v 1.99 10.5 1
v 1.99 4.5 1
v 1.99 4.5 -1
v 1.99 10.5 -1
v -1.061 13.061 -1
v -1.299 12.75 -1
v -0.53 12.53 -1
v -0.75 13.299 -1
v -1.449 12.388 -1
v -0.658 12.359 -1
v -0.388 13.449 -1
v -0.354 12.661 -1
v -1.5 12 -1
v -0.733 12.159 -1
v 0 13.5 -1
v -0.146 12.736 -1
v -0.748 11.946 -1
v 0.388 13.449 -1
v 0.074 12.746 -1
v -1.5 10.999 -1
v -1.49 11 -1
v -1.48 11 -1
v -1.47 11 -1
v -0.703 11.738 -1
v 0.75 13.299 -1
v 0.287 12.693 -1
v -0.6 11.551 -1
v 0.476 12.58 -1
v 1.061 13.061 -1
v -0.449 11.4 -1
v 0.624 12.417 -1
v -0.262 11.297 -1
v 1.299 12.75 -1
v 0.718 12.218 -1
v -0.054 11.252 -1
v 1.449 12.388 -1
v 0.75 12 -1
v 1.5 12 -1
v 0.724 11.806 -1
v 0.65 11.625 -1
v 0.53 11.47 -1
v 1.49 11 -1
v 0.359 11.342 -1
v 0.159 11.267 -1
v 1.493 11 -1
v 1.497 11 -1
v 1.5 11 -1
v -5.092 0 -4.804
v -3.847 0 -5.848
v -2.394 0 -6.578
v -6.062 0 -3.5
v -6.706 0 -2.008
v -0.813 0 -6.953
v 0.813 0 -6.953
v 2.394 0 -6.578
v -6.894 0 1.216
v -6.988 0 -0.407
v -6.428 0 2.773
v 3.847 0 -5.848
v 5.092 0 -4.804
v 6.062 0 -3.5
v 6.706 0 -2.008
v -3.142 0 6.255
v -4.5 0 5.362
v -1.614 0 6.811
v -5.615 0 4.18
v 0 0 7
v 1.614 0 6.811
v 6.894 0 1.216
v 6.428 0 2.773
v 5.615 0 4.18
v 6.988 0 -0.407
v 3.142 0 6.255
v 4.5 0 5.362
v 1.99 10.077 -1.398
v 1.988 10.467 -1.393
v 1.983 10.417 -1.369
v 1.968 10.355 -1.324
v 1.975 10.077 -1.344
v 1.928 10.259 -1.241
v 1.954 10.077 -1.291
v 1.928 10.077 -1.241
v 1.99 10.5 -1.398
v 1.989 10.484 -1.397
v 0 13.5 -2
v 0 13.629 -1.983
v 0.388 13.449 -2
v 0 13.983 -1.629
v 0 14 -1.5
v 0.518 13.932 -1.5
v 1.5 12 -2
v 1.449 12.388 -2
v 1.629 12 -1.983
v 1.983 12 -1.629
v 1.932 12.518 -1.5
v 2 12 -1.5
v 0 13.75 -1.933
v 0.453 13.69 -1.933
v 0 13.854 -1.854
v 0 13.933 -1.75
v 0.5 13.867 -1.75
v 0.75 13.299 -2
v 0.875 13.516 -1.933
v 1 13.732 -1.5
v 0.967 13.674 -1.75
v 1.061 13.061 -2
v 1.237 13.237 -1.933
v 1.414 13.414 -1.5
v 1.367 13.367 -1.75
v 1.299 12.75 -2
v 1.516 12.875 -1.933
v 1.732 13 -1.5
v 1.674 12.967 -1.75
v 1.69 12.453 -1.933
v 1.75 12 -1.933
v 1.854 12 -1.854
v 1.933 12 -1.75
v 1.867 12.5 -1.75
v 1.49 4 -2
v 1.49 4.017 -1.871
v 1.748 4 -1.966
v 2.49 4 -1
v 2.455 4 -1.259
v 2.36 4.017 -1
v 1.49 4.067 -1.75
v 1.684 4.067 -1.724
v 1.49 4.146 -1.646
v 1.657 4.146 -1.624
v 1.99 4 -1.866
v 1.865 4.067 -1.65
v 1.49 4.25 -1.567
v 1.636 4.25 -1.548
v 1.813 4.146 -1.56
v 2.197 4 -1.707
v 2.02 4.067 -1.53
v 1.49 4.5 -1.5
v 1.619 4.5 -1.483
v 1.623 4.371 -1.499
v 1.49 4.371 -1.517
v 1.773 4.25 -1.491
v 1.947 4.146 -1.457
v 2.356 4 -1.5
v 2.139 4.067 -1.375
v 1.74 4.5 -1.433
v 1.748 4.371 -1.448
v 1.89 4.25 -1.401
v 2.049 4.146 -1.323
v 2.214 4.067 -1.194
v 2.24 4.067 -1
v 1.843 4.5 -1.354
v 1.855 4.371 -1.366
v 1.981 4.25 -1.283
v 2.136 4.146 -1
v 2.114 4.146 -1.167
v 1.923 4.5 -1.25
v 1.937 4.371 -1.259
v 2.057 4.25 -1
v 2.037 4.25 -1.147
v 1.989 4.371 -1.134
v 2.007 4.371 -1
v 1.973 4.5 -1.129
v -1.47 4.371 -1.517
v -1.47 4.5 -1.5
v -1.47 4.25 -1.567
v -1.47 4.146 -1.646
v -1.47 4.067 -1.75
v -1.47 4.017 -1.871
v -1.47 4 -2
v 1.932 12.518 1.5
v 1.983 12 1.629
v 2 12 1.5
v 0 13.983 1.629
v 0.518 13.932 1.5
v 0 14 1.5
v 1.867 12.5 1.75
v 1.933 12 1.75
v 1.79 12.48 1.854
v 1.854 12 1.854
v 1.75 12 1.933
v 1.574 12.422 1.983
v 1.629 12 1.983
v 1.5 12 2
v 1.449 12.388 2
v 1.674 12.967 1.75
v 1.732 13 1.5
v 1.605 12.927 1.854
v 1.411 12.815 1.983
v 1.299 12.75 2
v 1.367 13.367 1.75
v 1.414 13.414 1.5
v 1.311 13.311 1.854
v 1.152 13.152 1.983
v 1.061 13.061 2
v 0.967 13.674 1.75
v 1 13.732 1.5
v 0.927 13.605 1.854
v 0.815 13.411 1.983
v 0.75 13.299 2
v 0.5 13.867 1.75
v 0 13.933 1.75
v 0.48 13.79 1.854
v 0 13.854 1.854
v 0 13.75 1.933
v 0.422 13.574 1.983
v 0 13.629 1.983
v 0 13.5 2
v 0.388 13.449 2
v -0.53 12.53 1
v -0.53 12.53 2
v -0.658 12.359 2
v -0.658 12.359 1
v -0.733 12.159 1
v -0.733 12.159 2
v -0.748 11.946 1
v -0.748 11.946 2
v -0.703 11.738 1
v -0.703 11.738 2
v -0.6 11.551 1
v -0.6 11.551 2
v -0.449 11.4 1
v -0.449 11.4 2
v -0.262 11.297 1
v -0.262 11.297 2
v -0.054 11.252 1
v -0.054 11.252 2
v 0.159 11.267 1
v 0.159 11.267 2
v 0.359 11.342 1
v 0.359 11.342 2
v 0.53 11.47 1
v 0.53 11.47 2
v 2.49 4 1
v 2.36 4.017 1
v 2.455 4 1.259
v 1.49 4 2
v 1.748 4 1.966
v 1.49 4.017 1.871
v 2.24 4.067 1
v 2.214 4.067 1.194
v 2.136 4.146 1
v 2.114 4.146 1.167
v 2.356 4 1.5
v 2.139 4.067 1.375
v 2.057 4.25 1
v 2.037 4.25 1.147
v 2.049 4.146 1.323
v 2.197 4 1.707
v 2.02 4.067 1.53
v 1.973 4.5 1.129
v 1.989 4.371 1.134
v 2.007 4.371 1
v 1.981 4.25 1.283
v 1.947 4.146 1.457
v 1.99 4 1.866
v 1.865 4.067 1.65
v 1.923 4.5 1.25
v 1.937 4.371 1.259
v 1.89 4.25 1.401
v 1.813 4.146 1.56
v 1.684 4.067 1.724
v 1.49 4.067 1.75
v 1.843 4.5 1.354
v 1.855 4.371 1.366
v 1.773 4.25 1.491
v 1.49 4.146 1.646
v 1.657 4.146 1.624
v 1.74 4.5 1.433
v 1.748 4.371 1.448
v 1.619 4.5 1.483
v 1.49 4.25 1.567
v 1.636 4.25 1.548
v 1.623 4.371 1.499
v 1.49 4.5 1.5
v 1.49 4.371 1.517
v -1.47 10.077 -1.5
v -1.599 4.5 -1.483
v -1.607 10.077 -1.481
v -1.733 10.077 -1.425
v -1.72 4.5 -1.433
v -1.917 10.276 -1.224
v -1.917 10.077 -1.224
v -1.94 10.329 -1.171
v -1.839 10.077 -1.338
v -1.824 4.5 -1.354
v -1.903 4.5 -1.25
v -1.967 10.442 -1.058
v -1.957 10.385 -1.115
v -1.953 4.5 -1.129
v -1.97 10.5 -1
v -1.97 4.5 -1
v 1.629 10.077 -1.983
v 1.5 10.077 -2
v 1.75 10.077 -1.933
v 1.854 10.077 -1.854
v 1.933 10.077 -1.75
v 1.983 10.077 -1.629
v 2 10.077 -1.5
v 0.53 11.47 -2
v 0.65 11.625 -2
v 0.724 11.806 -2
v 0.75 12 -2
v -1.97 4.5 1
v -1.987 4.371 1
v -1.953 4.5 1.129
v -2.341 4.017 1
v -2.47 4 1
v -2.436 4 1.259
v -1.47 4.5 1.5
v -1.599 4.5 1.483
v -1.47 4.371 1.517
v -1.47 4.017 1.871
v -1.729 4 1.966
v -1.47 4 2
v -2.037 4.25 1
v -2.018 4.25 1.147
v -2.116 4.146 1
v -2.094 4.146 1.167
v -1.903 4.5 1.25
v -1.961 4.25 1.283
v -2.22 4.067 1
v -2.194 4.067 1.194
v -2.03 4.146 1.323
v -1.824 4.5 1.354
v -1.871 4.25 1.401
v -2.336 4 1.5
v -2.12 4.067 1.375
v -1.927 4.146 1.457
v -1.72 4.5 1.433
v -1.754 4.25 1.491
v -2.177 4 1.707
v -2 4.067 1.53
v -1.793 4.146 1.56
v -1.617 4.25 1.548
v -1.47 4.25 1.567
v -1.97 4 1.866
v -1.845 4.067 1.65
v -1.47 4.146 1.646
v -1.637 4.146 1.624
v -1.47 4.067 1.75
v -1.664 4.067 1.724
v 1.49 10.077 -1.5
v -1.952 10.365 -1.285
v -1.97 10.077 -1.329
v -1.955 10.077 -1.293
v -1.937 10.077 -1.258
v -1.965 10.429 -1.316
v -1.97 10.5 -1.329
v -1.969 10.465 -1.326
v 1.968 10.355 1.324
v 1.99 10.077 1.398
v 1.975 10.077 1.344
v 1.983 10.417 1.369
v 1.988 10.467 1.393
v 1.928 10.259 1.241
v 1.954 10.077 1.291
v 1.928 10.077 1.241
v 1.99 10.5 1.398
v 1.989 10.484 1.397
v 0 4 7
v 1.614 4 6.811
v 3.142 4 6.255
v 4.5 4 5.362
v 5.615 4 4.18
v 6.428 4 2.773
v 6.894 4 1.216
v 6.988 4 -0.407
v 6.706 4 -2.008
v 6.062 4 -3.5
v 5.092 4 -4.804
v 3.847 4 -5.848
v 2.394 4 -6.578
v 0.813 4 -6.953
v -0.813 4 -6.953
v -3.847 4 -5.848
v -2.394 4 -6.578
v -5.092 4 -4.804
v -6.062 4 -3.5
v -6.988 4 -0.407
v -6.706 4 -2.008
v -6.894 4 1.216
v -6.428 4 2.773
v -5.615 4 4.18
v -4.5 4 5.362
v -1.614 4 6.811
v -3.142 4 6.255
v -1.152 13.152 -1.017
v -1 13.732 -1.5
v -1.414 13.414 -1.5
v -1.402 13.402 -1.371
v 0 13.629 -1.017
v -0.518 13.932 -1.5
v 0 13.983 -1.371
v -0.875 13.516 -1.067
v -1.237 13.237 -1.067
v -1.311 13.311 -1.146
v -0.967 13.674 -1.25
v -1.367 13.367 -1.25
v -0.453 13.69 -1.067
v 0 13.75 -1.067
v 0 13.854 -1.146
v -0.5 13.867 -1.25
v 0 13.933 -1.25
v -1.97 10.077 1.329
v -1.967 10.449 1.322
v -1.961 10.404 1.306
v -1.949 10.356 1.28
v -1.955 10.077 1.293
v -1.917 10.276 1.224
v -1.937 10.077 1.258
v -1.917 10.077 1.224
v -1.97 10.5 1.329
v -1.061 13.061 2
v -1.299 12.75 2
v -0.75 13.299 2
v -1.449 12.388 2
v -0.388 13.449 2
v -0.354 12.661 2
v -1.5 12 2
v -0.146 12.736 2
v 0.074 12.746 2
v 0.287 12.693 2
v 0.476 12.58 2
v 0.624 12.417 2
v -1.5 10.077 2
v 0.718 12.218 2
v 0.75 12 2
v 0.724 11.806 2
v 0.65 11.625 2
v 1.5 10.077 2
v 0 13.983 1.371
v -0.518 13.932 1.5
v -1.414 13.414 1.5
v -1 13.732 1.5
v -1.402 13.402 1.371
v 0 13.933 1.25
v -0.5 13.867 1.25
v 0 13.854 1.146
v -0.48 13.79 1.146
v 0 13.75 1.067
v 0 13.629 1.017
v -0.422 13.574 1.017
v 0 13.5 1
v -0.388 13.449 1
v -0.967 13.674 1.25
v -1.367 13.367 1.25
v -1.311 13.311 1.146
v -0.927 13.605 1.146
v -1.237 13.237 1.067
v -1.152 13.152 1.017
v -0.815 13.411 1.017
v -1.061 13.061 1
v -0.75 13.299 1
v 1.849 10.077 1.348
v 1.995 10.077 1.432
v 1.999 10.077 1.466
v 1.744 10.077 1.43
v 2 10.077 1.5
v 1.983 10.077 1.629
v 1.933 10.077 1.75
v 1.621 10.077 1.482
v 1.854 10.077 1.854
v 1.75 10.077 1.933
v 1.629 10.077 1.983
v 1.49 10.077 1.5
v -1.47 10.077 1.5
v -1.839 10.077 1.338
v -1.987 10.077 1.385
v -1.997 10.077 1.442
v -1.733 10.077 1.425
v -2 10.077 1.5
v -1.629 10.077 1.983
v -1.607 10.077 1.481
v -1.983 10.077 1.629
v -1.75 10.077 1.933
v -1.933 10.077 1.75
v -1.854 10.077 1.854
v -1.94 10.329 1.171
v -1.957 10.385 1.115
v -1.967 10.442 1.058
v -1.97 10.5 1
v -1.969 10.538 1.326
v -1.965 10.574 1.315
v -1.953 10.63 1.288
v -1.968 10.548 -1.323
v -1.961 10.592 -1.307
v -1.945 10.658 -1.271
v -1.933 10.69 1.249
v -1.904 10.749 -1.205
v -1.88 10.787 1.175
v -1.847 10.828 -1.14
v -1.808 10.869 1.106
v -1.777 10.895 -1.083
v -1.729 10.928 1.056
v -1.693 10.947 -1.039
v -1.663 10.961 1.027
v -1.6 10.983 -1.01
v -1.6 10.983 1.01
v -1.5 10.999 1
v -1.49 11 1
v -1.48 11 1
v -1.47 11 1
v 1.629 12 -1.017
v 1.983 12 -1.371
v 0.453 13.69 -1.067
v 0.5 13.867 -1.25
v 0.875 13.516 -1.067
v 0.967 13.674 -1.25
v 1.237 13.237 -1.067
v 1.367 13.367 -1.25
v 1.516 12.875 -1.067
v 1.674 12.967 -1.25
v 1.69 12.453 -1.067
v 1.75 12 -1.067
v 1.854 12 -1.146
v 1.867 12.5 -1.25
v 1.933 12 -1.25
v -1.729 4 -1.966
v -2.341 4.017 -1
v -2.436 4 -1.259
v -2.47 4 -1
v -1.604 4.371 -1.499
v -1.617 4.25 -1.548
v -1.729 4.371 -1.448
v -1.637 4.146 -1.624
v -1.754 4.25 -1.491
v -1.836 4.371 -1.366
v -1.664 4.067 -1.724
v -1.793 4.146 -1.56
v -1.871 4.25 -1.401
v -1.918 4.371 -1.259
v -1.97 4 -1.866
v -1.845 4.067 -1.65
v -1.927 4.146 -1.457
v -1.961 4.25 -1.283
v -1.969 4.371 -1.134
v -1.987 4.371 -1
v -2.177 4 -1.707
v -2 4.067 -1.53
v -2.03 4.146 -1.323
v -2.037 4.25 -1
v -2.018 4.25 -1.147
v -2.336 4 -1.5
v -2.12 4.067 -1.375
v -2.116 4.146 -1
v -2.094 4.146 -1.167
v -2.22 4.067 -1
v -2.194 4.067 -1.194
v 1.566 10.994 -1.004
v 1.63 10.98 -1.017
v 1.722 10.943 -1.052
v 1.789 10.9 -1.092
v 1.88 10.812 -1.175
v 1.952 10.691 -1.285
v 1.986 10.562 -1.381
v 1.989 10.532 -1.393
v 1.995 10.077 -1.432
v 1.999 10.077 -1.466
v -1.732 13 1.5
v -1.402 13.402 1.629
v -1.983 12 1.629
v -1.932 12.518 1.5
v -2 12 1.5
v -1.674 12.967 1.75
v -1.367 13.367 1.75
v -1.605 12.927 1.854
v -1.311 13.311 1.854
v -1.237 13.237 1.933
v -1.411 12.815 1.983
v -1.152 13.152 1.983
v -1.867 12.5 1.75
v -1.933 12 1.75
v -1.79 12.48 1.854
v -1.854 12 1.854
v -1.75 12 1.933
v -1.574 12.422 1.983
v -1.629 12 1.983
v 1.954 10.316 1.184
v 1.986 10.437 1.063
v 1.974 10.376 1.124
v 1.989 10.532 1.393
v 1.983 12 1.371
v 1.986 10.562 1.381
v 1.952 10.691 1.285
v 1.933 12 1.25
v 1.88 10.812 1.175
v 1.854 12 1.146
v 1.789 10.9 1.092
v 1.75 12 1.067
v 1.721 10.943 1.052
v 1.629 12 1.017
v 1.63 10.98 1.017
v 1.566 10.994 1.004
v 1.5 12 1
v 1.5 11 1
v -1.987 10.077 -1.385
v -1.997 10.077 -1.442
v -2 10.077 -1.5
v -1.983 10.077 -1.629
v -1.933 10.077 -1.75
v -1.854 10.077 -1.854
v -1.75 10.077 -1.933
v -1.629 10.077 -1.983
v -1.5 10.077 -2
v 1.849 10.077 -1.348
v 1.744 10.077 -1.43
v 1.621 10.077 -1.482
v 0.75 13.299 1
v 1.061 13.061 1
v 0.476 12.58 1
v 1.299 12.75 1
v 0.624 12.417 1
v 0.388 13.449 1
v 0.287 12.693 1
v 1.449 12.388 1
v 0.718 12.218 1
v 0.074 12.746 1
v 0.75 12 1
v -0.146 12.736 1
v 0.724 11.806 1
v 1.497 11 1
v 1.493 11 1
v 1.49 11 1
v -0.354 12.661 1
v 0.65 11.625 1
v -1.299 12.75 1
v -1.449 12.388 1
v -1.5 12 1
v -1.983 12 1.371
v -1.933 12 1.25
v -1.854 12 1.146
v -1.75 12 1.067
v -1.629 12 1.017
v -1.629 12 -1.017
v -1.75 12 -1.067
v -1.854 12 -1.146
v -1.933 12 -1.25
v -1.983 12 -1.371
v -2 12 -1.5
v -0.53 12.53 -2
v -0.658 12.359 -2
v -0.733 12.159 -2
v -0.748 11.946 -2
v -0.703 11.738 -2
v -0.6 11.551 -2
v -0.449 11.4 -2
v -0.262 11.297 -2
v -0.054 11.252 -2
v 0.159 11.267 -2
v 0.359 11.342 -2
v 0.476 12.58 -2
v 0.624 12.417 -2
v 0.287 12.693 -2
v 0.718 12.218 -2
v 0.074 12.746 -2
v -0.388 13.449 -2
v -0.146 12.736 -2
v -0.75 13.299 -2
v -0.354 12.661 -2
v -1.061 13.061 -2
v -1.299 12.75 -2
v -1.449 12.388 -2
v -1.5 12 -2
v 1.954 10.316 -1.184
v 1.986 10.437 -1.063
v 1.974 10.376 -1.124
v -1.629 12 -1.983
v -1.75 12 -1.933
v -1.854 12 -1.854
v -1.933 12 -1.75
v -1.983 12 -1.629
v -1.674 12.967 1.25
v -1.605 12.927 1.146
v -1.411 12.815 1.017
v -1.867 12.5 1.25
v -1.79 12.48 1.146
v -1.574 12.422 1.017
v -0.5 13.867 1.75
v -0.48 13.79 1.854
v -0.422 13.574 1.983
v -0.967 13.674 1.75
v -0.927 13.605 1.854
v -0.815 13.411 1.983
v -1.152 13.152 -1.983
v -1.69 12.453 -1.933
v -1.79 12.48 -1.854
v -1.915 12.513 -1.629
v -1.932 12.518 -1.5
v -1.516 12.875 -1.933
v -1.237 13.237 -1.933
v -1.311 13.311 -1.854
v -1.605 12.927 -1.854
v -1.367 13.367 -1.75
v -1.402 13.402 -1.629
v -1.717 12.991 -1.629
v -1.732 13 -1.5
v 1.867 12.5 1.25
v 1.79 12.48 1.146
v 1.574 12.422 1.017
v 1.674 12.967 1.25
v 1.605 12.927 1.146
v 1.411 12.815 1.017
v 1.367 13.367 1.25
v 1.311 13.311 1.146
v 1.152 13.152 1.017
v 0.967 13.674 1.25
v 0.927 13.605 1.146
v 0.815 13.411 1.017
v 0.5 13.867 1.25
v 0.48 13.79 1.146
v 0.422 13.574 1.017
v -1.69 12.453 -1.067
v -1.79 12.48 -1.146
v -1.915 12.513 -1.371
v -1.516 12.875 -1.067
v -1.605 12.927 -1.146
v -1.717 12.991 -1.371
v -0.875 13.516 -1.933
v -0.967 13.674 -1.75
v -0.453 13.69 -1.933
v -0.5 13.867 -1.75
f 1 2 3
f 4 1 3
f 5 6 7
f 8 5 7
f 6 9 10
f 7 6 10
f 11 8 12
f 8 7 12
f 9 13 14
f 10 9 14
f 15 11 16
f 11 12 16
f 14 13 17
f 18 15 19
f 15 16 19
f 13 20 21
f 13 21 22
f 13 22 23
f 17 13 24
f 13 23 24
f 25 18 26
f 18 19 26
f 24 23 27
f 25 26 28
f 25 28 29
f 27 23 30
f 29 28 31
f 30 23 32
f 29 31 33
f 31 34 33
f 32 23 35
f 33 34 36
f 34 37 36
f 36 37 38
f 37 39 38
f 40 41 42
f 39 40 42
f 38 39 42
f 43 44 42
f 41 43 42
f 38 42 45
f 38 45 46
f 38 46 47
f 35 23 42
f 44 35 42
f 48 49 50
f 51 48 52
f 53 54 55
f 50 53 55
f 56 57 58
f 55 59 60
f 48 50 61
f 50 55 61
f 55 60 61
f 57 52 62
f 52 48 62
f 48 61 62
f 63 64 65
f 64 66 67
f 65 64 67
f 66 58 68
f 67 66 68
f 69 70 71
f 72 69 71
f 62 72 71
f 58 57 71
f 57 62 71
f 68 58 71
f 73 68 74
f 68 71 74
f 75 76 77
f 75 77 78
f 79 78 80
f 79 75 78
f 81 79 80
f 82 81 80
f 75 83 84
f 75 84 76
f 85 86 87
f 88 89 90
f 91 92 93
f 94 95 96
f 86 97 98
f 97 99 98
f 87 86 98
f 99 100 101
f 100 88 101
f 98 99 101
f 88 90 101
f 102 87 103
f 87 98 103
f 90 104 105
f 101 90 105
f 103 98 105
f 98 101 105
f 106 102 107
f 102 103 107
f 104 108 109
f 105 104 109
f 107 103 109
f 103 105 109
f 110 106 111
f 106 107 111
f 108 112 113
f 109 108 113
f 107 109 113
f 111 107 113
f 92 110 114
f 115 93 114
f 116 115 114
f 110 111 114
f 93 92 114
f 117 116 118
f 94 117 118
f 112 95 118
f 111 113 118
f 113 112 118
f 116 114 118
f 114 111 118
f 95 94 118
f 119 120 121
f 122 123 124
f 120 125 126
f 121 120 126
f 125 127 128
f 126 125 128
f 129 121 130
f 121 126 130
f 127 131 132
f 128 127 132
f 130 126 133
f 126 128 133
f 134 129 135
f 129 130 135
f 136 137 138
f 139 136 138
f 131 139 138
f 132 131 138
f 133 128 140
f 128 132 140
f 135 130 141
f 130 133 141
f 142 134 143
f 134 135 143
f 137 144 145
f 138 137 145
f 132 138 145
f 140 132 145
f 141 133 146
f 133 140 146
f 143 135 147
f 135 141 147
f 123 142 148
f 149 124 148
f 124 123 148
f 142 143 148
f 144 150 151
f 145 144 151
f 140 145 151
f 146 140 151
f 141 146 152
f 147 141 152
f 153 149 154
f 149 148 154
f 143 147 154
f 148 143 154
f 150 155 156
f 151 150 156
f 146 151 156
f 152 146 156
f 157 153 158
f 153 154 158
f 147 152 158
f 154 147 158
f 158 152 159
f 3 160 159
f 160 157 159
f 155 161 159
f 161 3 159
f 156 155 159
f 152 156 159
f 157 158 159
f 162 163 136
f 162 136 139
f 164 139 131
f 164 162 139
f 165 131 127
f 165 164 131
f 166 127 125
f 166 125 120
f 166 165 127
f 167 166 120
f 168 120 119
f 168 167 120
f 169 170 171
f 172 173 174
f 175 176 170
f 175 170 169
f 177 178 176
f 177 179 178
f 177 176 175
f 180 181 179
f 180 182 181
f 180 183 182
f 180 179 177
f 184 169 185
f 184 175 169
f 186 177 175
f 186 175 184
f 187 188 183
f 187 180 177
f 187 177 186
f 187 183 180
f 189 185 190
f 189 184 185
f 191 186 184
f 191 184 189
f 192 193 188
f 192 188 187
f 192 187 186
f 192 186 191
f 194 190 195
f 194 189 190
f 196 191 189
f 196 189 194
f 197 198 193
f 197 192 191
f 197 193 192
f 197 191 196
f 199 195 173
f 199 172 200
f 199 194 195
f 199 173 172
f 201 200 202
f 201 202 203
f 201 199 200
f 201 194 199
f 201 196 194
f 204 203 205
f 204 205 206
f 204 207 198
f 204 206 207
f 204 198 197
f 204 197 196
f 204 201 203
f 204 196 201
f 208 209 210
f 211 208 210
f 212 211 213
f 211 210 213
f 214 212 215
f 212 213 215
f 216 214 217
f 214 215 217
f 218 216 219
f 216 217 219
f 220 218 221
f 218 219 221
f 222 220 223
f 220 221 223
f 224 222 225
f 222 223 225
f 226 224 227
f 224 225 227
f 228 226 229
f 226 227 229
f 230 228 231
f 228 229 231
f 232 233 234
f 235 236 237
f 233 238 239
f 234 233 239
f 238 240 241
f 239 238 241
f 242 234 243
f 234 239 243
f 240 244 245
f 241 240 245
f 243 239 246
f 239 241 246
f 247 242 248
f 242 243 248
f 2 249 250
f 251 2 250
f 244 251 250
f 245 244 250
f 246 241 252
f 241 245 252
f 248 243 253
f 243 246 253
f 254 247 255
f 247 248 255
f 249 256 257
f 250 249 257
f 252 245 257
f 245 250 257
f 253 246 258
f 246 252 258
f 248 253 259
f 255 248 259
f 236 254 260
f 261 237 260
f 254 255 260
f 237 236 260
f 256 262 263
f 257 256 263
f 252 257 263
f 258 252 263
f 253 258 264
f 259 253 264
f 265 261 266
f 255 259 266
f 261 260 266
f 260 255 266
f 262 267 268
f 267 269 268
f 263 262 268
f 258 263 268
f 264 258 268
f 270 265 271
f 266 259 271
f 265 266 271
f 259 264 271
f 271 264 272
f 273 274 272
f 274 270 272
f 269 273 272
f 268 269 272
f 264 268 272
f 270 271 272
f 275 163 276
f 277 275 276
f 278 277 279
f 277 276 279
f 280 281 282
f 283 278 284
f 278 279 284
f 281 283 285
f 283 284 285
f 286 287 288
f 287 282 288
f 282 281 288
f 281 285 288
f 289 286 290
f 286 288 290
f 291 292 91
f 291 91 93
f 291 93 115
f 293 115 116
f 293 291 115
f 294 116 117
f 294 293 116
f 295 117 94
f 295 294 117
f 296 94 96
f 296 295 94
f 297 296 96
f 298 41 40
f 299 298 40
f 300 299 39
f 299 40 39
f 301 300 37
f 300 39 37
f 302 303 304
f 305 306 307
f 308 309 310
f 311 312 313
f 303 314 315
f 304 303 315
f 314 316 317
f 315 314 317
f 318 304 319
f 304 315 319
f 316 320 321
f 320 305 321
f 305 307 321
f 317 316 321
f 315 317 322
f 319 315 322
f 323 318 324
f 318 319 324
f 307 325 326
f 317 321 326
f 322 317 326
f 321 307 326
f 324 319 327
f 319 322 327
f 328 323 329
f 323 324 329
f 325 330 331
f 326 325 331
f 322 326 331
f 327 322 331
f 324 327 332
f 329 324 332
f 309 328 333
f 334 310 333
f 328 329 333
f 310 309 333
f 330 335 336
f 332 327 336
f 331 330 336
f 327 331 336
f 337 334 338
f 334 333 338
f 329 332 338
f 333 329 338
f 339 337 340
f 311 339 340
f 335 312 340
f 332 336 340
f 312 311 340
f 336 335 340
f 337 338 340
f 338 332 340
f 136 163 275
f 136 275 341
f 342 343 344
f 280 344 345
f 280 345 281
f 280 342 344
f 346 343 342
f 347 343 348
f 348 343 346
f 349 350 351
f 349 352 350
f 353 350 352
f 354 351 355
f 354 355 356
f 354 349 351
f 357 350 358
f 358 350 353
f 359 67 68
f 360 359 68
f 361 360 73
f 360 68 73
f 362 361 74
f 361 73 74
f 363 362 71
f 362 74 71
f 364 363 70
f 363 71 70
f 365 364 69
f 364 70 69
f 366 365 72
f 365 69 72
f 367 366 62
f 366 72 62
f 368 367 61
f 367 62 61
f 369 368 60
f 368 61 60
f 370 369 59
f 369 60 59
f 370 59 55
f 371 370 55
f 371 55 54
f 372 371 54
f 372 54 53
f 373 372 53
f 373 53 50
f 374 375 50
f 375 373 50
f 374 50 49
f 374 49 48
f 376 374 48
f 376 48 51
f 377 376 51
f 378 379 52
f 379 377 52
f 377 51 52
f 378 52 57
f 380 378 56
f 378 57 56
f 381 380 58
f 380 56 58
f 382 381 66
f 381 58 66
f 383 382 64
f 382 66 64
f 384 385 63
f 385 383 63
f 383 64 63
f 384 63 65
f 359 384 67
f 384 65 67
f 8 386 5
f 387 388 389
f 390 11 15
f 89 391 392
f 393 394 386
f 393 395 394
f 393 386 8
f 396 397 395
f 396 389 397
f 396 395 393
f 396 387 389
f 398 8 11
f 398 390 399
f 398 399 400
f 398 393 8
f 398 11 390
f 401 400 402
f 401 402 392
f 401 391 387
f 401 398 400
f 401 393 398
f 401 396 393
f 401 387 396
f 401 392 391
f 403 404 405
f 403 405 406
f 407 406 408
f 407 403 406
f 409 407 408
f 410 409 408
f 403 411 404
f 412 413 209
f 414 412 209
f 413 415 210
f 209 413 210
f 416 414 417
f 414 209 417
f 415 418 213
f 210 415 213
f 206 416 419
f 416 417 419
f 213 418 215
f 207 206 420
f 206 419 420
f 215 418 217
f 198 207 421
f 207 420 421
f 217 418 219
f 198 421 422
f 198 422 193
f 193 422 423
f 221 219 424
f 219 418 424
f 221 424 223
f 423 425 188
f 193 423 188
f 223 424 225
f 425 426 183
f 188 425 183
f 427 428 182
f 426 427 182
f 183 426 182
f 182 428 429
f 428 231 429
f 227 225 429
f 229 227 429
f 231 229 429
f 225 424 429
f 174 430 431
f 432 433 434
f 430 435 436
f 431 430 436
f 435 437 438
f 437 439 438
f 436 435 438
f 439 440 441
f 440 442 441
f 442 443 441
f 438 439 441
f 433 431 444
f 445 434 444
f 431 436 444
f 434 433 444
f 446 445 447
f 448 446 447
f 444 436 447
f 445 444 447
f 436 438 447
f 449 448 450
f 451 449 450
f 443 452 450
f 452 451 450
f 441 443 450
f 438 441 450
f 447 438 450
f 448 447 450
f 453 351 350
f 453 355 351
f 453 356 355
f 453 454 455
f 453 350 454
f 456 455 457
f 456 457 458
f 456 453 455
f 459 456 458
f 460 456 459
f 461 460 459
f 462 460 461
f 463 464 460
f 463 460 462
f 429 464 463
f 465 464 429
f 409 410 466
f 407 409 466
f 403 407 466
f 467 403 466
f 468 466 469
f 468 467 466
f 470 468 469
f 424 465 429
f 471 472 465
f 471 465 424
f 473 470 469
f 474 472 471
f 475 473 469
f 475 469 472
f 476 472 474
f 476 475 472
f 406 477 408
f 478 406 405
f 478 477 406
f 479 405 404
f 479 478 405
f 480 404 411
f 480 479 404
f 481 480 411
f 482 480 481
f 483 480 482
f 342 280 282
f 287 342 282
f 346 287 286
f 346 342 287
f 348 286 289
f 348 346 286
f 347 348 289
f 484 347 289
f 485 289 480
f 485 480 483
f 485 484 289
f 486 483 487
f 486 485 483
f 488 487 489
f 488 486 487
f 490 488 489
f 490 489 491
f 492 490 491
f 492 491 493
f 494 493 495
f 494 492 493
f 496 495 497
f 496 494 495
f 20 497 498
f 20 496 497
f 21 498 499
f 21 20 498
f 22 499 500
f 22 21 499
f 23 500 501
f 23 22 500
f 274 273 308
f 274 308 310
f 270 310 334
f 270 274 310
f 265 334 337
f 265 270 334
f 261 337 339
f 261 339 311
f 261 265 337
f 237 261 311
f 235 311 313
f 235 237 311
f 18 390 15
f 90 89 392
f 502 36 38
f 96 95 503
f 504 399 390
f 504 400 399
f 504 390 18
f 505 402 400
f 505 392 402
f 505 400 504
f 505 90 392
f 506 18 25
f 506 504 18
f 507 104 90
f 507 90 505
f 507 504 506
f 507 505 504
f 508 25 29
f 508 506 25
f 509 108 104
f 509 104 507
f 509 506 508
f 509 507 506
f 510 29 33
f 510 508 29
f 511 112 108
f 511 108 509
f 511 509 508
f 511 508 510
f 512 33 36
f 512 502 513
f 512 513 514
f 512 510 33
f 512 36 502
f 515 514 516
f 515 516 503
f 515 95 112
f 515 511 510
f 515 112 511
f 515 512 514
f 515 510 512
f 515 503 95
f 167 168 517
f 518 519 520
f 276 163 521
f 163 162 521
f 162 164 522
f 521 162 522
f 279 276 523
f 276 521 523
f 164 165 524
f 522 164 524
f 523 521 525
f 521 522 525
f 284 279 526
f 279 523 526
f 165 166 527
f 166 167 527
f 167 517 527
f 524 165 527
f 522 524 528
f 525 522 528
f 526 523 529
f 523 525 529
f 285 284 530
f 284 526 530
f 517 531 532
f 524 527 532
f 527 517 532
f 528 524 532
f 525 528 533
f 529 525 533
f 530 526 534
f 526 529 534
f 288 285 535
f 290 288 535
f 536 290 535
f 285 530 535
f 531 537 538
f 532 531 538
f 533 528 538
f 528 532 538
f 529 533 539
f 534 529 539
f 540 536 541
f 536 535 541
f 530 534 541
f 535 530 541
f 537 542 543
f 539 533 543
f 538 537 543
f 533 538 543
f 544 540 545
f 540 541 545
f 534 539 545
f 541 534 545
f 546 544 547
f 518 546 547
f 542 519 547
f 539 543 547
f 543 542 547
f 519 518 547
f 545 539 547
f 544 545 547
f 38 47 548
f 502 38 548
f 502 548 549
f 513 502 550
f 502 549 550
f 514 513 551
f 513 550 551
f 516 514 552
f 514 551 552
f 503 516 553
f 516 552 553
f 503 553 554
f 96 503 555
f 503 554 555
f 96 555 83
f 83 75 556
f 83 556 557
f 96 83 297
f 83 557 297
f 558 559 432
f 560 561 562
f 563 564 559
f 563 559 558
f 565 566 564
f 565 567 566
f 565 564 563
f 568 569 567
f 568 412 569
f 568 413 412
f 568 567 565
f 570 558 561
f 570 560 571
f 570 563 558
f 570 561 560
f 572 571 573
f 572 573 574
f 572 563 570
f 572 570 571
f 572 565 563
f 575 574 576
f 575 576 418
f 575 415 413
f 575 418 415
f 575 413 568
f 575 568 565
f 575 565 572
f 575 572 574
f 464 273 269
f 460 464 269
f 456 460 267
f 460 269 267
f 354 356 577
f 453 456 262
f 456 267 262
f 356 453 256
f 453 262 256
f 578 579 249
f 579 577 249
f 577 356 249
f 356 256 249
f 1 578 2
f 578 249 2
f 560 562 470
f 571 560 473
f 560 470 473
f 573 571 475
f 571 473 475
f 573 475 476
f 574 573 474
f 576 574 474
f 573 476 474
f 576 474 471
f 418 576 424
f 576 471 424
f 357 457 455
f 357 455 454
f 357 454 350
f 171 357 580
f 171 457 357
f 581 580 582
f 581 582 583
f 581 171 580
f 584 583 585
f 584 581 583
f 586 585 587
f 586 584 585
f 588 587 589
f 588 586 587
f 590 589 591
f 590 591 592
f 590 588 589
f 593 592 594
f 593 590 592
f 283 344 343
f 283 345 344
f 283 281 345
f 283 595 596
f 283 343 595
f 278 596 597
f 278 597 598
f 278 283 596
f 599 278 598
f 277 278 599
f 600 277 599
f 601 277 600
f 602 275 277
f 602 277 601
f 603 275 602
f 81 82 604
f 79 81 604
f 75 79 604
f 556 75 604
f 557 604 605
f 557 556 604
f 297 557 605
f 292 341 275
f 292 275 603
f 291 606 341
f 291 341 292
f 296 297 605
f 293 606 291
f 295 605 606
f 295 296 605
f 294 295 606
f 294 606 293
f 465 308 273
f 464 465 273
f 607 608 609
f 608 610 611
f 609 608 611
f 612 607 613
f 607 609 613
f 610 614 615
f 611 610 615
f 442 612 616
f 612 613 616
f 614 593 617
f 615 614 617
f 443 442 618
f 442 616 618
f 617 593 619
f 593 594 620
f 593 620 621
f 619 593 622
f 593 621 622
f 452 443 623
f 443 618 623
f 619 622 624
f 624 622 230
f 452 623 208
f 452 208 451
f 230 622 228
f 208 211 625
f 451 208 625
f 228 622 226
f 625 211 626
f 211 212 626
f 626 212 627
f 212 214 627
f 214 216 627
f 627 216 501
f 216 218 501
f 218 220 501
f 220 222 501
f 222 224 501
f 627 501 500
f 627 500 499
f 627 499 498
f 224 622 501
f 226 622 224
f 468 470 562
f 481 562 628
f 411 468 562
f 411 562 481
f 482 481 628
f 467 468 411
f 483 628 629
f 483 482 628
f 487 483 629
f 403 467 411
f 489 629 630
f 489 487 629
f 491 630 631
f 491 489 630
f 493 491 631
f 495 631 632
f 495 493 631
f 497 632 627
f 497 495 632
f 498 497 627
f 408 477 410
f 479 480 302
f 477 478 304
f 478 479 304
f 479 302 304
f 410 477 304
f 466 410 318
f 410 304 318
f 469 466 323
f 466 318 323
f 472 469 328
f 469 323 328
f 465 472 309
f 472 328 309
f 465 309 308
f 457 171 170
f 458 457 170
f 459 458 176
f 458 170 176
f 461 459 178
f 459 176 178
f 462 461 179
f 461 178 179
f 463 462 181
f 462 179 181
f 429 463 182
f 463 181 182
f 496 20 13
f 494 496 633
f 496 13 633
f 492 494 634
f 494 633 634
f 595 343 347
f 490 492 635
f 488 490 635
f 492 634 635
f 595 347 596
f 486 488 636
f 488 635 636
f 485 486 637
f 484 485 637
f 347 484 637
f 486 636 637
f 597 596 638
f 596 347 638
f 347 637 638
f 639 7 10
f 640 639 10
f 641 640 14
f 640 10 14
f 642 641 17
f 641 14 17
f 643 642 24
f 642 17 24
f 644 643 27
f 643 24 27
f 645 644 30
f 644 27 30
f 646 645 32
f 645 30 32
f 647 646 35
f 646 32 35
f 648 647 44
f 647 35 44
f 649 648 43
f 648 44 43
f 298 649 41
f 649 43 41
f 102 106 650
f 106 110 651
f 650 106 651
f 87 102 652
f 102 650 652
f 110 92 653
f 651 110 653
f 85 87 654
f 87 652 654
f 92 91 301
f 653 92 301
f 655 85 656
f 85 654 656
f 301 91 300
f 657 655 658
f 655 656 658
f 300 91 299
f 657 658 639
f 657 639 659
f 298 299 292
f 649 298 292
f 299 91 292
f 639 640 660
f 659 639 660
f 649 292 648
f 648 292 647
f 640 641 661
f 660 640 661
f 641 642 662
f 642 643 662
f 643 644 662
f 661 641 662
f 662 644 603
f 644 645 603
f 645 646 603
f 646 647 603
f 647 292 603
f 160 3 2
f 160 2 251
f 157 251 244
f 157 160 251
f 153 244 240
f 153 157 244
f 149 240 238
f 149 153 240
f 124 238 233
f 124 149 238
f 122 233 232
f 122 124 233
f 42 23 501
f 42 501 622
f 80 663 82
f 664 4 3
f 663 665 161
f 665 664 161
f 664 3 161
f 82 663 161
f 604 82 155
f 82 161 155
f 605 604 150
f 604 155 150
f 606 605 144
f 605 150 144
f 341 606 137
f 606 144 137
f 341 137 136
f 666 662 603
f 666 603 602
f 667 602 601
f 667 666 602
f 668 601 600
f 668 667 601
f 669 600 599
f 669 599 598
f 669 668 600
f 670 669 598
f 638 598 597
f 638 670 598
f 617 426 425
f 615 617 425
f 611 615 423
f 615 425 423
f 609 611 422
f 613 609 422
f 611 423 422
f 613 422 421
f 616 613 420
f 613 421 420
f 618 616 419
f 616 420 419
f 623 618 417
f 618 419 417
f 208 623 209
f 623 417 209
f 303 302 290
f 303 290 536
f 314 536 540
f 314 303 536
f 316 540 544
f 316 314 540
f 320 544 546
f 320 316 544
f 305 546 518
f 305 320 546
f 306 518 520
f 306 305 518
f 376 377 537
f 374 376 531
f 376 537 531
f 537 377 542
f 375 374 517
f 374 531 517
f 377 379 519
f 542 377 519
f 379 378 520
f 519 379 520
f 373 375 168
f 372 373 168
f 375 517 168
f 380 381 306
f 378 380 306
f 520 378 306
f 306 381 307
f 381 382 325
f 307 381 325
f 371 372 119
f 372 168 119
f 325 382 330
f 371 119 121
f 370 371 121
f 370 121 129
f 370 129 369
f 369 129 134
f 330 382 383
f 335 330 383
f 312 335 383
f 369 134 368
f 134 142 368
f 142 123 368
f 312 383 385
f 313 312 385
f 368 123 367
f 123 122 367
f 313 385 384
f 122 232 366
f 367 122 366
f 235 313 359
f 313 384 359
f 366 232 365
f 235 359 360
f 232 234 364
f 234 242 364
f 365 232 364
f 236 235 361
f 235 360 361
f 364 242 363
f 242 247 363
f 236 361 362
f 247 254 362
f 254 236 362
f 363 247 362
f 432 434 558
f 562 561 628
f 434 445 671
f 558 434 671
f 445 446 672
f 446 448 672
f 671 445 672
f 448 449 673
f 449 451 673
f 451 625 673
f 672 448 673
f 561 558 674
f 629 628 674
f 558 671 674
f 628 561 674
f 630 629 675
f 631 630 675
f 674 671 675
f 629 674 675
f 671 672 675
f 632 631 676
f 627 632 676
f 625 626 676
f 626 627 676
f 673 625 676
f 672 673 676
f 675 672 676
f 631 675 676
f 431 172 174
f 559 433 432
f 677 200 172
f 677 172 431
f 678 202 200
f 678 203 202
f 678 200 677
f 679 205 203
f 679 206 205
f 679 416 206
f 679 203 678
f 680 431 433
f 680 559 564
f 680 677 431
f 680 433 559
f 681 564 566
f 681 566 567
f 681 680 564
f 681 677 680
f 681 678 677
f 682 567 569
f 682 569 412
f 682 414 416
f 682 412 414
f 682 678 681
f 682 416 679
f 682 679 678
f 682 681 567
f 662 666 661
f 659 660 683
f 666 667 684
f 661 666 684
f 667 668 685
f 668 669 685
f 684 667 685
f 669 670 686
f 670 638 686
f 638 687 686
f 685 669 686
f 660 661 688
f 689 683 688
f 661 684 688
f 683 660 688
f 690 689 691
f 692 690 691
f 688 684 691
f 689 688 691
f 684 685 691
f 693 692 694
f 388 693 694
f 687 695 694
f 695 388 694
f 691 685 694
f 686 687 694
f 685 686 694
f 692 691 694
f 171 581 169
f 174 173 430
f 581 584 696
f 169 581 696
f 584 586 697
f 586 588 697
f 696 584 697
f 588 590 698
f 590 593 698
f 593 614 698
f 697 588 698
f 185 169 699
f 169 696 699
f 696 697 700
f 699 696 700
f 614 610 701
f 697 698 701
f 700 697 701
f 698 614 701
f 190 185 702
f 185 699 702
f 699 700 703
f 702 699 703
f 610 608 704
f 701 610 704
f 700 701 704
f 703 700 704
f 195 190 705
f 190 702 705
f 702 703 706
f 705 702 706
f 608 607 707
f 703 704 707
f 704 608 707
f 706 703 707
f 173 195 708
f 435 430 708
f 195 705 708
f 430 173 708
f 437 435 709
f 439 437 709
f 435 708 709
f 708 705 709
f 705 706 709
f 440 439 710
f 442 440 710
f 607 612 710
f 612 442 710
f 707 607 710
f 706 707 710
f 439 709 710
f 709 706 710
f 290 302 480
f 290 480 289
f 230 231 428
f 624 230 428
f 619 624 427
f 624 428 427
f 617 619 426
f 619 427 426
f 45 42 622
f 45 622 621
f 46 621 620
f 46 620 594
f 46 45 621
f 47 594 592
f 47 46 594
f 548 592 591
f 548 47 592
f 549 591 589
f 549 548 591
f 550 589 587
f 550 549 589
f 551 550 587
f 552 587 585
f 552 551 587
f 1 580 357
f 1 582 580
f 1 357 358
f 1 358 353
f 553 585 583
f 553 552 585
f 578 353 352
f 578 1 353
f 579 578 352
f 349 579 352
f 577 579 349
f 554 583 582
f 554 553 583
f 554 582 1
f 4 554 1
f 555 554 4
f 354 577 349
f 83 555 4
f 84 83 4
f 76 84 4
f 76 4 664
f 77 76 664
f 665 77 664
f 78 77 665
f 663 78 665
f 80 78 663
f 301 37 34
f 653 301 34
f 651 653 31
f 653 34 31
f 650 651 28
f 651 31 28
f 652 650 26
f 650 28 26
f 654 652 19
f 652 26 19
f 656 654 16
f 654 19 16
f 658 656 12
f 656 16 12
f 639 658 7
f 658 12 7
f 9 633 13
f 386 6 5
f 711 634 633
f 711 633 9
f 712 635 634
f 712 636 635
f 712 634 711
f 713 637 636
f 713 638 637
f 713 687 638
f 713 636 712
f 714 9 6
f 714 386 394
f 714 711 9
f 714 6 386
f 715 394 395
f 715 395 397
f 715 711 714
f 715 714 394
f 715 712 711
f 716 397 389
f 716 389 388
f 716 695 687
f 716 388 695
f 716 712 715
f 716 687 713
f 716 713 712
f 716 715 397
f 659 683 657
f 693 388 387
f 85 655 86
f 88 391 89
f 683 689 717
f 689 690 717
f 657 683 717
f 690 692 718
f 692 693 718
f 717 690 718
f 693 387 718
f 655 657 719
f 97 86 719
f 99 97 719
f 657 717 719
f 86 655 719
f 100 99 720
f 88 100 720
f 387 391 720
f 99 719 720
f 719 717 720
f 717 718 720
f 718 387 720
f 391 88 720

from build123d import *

# Parameters (mm, degrees)
SKETCH1_R           = 7
BOSS_EXTRUDE1_DEPTH = 10
SKETCH2_W           = 2
SKETCH2_H           = 1
BOSS_EXTRUDE2_DEPTH = 4
CUT_EXTRUDE2_DEPTH  = 10
FILLET1_R           = 1
FILLET2_R           = 0.5
CUT_EXTRUDE4_DEPTH  = 10
SKETCH5_W           = 3.959584723
SKETCH5_H           = 3
BOSS_EXTRUDE3_DEPTH = 7
FILLET3_R           = 0.5
FILLET4_R           = 0.5


# Some blends are built 0.0001 mm under size
with BuildPart() as part:
    # Sketch1 → Boss-Extrude1 (new body)
    with BuildSketch(Plane(origin=(0, 0, 0), x_dir=(1, 0, 0), z_dir=(0, 1, 0))):
        with Locations(Location((0, 0, 0), (0, 0, 270))):
            Circle(SKETCH1_R)
    extrude(amount=BOSS_EXTRUDE1_DEPTH)

    # Sketch2 → Boss-Extrude2 (add)
    with BuildSketch(Plane(origin=(0, 10, 0), x_dir=(1, 0, 0), z_dir=(0, 1, 0))):
        with Locations((-1, 1.5)):
            Rectangle(SKETCH2_W, SKETCH2_H)
        with Locations((1, 1.5)):
            Rectangle(SKETCH2_W, SKETCH2_H)
        with Locations((1, -1.5)):
            Rectangle(SKETCH2_W, SKETCH2_H)
        with Locations((-1, -1.5)):
            Rectangle(SKETCH2_W, SKETCH2_H)
    extrude(amount=BOSS_EXTRUDE2_DEPTH)

    # Sketch3 → Cut-Extrude2 (cut)
    with BuildSketch(Plane.XY.offset(2)):
        with BuildLine():
            Line((2, 14), (0, 14))
            ThreePointArc((0, 14), (1.414213562, 13.414213562), (2, 12))
            Line((2, 12), (2, 14))
        make_face()
        with BuildLine():
            Line((0, 14), (-2, 14))
            Line((-2, 14), (-1.414213562, 13.414213562))
            ThreePointArc((-1.414213562, 13.414213562), (-0.765366865, 13.847759065), (0, 14))
        make_face()
        with BuildLine():
            Line((-1.414213562, 13.414213562), (-2, 14))
            Line((-2, 14), (-2, 12))
            ThreePointArc((-2, 12), (-1.847759065, 12.765366865), (-1.414213562, 13.414213562))
        make_face()
        with BuildLine():
            ThreePointArc((0.75, 12), (0.287012574, 12.692909649), (-0.530330086, 12.530330086))
            Line((-0.530330086, 12.530330086), (0.530330086, 11.469669914))
            ThreePointArc((0.530330086, 11.469669914), (0.692909649, 11.712987426), (0.75, 12))
        make_face()
        with BuildLine():
            Line((0.530330086, 11.469669914), (-0.530330086, 12.530330086))
            ThreePointArc((-0.530330086, 12.530330086), (-0.530330086, 11.469669914), (0.530330086, 11.469669914))
        make_face()
    extrude(amount=-CUT_EXTRUDE2_DEPTH, mode=Mode.SUBTRACT)

    # Fillet1
    fillet1_edges = [part.edges().sort_by_distance(p)[0] for p in [
        (0, 10, -7),
    ]]
    fillet(fillet1_edges, radius=FILLET1_R)

    # Fillet2
    fillet2_edges = [part.edges().sort_by_distance(p)[0] for p in [
        (2, 11, 1),
        (-2, 11, 1),
        (2, 11, 2),
        (-2, 11, 2),
        (-2, 11, -2),
        (2, 11, -2),
        (-2, 11, -1),
        (2, 11, -1),
        (0, 14, 1),
        (0, 14, 2),
        (0, 14, -2),
        (0, 14, -1),
    ]]
    fillet(fillet2_edges, radius=FILLET2_R - 0.0001)  # a hair under: the kernel refuses the full size

    # Sketch4 → Cut-Extrude4 (cut, symmetric)
    with BuildSketch(Plane.XY):
        Polygon((-7, 4), (7, 4), (9.323554176, 4), (9.323554176, 10.076967931), (-7.870406088, 10.076967931), (-7.870406088, 4), align=None)
    extrude(amount=CUT_EXTRUDE4_DEPTH, both=True, mode=Mode.SUBTRACT)


with BuildPart() as cut_extrude4_piece_1:
    # of the separate pieces the step leaves, piece 1, a body of its own (cut_extrude4_pieces)
    add(part.part.solids().sort_by_distance((0, 0, 7))[0])



with BuildPart() as cut_extrude4_piece_2:
    # of the separate pieces the step leaves, piece 2, a body of its own (cut_extrude4_pieces)
    add(part.part.solids().sort_by_distance((-1.5001, 10.076967931, 2))[0])


with BuildPart() as cut_extrude4_piece_3:
    # of the separate pieces the step leaves, piece 3, a body of its own (cut_extrude4_pieces)
    add(part.part.solids().sort_by_distance((-2, 10.076967931, -1.5001))[0])


with BuildPart() as cut_extrude4_piece_1_1:
    add(cut_extrude4_piece_1.part)

    add(cut_extrude4_piece_2.part)  # Boss-Extrude3 merges Cut-Extrude4 piece 2

    add(cut_extrude4_piece_3.part)  # Boss-Extrude3 merges Cut-Extrude4 piece 3
    # Sketch5 → Boss-Extrude3 (add)
    with BuildSketch(Plane(origin=(0, 4, 0), x_dir=(1, 0, 0), z_dir=(0, 1, 0))):
        with Locations((0.009752672, 0)):
            Rectangle(SKETCH5_W, SKETCH5_H)
    extrude(amount=BOSS_EXTRUDE3_DEPTH)

    # Fillet3
    fillet3_edges = [cut_extrude4_piece_1_1.edges().sort_by_distance(p)[0] for p in [
        (-1.97003969, 11, 0),
        (1.989545033, 11, 0),
    ]]
    fillet(fillet3_edges, radius=FILLET3_R)

    # Fillet4
    # the kernel refuses this fillet: 0.5 mm, written as the material it takes off along each edge
    with BuildSketch(Plane(origin=(-1.97003969, 4, 1.5), x_dir=(0, 0, -1), z_dir=(0, 1, 0)), Plane(origin=(1.989545033, 4, 1.5), x_dir=(-1, 0, 0), z_dir=(0, 1, 0))) as fillet4_piece_1:
        with BuildLine():
            CenterArc((FILLET4_R, -FILLET4_R), FILLET4_R, 90, 90)
            Line((0, -FILLET4_R), (0, 0))
            Line((0, 0), (FILLET4_R, 0))
        make_face()
    extrude(amount=6.076967931, mode=Mode.SUBTRACT)
    with BuildSketch(Plane(origin=(-1.97003969, 4, 1.5), x_dir=(0, 0, -1), z_dir=(0, 1, 0))) as fillet4_piece_2_section:
        with BuildLine():
            CenterArc((FILLET4_R, -FILLET4_R), FILLET4_R, 90, 90)
            Line((0, -FILLET4_R), (0, 0))
            Line((0, 0), (FILLET4_R, 0))
        make_face()
    fillet4_piece_2 = extrude(amount=7.326967931, mode=Mode.PRIVATE)
    fillet4_piece_2 = fillet4_piece_2 - Plane(origin=(-1.47003969, 10.5, 1.201598319), x_dir=(-1, 0, 0), z_dir=(0, 0, -1)) * Cylinder(0.5, 17, mode=Mode.PRIVATE)
    fillet4_piece_2 = fillet4_piece_2 - Plane(origin=(-1.5001, 10.234965589, 1.4999), x_dir=(-1, 0, 0), z_dir=(0, -1, 0)) * Cylinder(0.4999, 17, mode=Mode.PRIVATE)
    add(fillet4_piece_2, mode=Mode.SUBTRACT)
    with BuildSketch(Plane(origin=(-1.97003969, 4, -1.5), x_dir=(0, 0, 1), z_dir=(0, 1, 0)), Plane(origin=(1.989545033, 4, -1.5), x_dir=(-1, 0, 0), z_dir=(0, 1, 0))) as fillet4_piece_3:
        with BuildLine():
            CenterArc((FILLET4_R, FILLET4_R), FILLET4_R, 180, 90)
            Line((0, FILLET4_R), (0, 0))
            Line((0, 0), (FILLET4_R, 0))
        make_face()
    extrude(amount=6.076967931, mode=Mode.SUBTRACT)
    with BuildSketch(Plane(origin=(-1.97003969, 4, -1.5), x_dir=(0, 0, 1), z_dir=(0, 1, 0))) as fillet4_piece_4_section:
        with BuildLine():
            CenterArc((FILLET4_R, FILLET4_R), FILLET4_R, 180, 90)
            Line((0, FILLET4_R), (0, 0))
            Line((0, 0), (FILLET4_R, 0))
        make_face()
    fillet4_piece_4 = extrude(amount=7.326967931, mode=Mode.PRIVATE)
    fillet4_piece_4 = fillet4_piece_4 - Plane(origin=(-1.5001, 10.234965589, -1.4999), x_dir=(-1, 0, 0), z_dir=(0, 1, 0)) * Cylinder(0.4999, 17, mode=Mode.PRIVATE)
    fillet4_piece_4 = fillet4_piece_4 - Plane(origin=(-1.47003969, 10.5, -1.201598319), x_dir=(-1, 0, 0), z_dir=(0, 0, -1)) * Cylinder(0.5, 17, mode=Mode.PRIVATE)
    add(fillet4_piece_4, mode=Mode.SUBTRACT)
    with BuildSketch(Plane(origin=(1.989545033, 4, -1.5), x_dir=(-1, 0, 0), z_dir=(0, 1, 0))) as fillet4_piece_5_section:
        with BuildLine():
            CenterArc((FILLET4_R, FILLET4_R), FILLET4_R, 180, 90)
            Line((0, FILLET4_R), (0, 0))
            Line((0, 0), (FILLET4_R, 0))
        make_face()
    fillet4_piece_5 = extrude(amount=7.326967931, mode=Mode.PRIVATE)
    fillet4_piece_5 = fillet4_piece_5 - Plane(origin=(1.489545033, 10.5, -1.228788283), x_dir=(1, 0, 0), z_dir=(0, 0, 1)) * Cylinder(0.5, 17, mode=Mode.PRIVATE)
    fillet4_piece_5 = fillet4_piece_5 - Plane(origin=(1.5001, 10.231594364, -1.4999), x_dir=(1, 0, 0), z_dir=(0, -1, 0)) * Cylinder(0.4999, 17, mode=Mode.PRIVATE)
    add(fillet4_piece_5, mode=Mode.SUBTRACT)
    with BuildSketch(Plane(origin=(1.989545033, 4, 1.5), x_dir=(-1, 0, 0), z_dir=(0, 1, 0))) as fillet4_piece_6_section:
        with BuildLine():
            CenterArc((FILLET4_R, -FILLET4_R), FILLET4_R, 90, 90)
            Line((0, -FILLET4_R), (0, 0))
            Line((0, 0), (FILLET4_R, 0))
        make_face()
    fillet4_piece_6 = extrude(amount=7.326967931, mode=Mode.PRIVATE)
    fillet4_piece_6 = fillet4_piece_6 - Plane(origin=(1.489545033, 10.5, 1.228788283), x_dir=(1, 0, 0), z_dir=(0, 0, 1)) * Cylinder(0.5, 17, mode=Mode.PRIVATE)
    fillet4_piece_6 = fillet4_piece_6 - Plane(origin=(1.5001, 10.231594364, 1.4999), x_dir=(1, 0, 0), z_dir=(0, 1, 0)) * Cylinder(0.4999, 17, mode=Mode.PRIVATE)
    add(fillet4_piece_6, mode=Mode.SUBTRACT)
    # the kernel refuses this fillet: 0.5 mm, written as the material it adds along each edge
    with BuildSketch(Plane(origin=(-1.97003969, 4, 1), x_dir=(0, 1, 0), z_dir=(0, 0, -1)), Plane(origin=(1.989545033, 4, -1), x_dir=(0, 1, 0), z_dir=(0, 0, 1))) as fillet4_2_piece_1:
        with BuildLine():
            CenterArc((FILLET4_R, -FILLET4_R), FILLET4_R, 90, 90)
            Line((0, -FILLET4_R), (0, 0))
            Line((0, 0), (FILLET4_R, 0))
        make_face()
    extrude(amount=2)
    with BuildSketch(Plane(origin=(-1.47003969, 4, -1.5), x_dir=(0, 0, -1), z_dir=(1, 0, 0))) as fillet4_2_piece_2:
        with BuildLine():
            CenterArc((FILLET4_R, FILLET4_R), FILLET4_R, 180, 90)
            Line((0, FILLET4_R), (0, 0))
            Line((0, 0), (FILLET4_R, 0))
        make_face()
    extrude(amount=2.959584723)
    with BuildSketch(Plane(origin=(1.489545033, 4, 1.5), x_dir=(0, 1, 0), z_dir=(-1, 0, 0))) as fillet4_2_piece_3:
        with BuildLine():
            CenterArc((FILLET4_R, -FILLET4_R), FILLET4_R, 90, 90)
            Line((0, -FILLET4_R), (0, 0))
            Line((0, 0), (FILLET4_R, 0))
        make_face()
    extrude(amount=2.959584723)
    with BuildSketch(Plane(origin=(1.489545033, 4, -1), x_dir=(0, 0, -1), z_dir=(-1, 0, 0))) as fillet4_2_piece_4:
        with BuildLine():
            CenterArc((0.5 + FILLET4_R, -FILLET4_R), FILLET4_R, 90, 90)
            Line((0.5 + FILLET4_R, 0), (0.5, 0))
            Line((0.5, 0), (0.5, -FILLET4_R))
        make_face()
    revolve(axis=Axis((1.489545033, 4, -1), (0, -1, 0)), revolution_arc=90)
    with BuildSketch(Plane(origin=(1.489545033, 4, 1), x_dir=(1, 0, 0), z_dir=(0, 0, -1))) as fillet4_2_piece_5:
        with BuildLine():
            CenterArc((0.5 + FILLET4_R, -FILLET4_R), FILLET4_R, 90, 90)
            Line((0.5 + FILLET4_R, 0), (0.5, 0))
            Line((0.5, 0), (0.5, -FILLET4_R))
        make_face()
    revolve(axis=Axis((1.489545033, 4, 1), (0, -1, 0)), revolution_arc=90)
    with BuildSketch(Plane(origin=(-1.47003969, 4, 1), x_dir=(-1, 0, 0), z_dir=(0, 0, -1))) as fillet4_2_piece_6:
        with BuildLine():
            CenterArc((0.5 + FILLET4_R, FILLET4_R), FILLET4_R, 180, 90)
            Line((0.5 + FILLET4_R, 0), (0.5, 0))
            Line((0.5, 0), (0.5, FILLET4_R))
        make_face()
    revolve(axis=Axis((-1.47003969, 4, 1), (0, 1, 0)), revolution_arc=90)
    with BuildSketch(Plane(origin=(-1.47003969, 4, -1), x_dir=(0, 0, -1), z_dir=(1, 0, 0))) as fillet4_2_piece_7:
        with BuildLine():
            CenterArc((0.5 + FILLET4_R, FILLET4_R), FILLET4_R, 180, 90)
            Line((0.5 + FILLET4_R, 0), (0.5, 0))
            Line((0.5, 0), (0.5, FILLET4_R))
        make_face()
    revolve(axis=Axis((-1.47003969, 4, -1), (0, 1, 0)), revolution_arc=90)


solid = cut_extrude4_piece_1_1.part
